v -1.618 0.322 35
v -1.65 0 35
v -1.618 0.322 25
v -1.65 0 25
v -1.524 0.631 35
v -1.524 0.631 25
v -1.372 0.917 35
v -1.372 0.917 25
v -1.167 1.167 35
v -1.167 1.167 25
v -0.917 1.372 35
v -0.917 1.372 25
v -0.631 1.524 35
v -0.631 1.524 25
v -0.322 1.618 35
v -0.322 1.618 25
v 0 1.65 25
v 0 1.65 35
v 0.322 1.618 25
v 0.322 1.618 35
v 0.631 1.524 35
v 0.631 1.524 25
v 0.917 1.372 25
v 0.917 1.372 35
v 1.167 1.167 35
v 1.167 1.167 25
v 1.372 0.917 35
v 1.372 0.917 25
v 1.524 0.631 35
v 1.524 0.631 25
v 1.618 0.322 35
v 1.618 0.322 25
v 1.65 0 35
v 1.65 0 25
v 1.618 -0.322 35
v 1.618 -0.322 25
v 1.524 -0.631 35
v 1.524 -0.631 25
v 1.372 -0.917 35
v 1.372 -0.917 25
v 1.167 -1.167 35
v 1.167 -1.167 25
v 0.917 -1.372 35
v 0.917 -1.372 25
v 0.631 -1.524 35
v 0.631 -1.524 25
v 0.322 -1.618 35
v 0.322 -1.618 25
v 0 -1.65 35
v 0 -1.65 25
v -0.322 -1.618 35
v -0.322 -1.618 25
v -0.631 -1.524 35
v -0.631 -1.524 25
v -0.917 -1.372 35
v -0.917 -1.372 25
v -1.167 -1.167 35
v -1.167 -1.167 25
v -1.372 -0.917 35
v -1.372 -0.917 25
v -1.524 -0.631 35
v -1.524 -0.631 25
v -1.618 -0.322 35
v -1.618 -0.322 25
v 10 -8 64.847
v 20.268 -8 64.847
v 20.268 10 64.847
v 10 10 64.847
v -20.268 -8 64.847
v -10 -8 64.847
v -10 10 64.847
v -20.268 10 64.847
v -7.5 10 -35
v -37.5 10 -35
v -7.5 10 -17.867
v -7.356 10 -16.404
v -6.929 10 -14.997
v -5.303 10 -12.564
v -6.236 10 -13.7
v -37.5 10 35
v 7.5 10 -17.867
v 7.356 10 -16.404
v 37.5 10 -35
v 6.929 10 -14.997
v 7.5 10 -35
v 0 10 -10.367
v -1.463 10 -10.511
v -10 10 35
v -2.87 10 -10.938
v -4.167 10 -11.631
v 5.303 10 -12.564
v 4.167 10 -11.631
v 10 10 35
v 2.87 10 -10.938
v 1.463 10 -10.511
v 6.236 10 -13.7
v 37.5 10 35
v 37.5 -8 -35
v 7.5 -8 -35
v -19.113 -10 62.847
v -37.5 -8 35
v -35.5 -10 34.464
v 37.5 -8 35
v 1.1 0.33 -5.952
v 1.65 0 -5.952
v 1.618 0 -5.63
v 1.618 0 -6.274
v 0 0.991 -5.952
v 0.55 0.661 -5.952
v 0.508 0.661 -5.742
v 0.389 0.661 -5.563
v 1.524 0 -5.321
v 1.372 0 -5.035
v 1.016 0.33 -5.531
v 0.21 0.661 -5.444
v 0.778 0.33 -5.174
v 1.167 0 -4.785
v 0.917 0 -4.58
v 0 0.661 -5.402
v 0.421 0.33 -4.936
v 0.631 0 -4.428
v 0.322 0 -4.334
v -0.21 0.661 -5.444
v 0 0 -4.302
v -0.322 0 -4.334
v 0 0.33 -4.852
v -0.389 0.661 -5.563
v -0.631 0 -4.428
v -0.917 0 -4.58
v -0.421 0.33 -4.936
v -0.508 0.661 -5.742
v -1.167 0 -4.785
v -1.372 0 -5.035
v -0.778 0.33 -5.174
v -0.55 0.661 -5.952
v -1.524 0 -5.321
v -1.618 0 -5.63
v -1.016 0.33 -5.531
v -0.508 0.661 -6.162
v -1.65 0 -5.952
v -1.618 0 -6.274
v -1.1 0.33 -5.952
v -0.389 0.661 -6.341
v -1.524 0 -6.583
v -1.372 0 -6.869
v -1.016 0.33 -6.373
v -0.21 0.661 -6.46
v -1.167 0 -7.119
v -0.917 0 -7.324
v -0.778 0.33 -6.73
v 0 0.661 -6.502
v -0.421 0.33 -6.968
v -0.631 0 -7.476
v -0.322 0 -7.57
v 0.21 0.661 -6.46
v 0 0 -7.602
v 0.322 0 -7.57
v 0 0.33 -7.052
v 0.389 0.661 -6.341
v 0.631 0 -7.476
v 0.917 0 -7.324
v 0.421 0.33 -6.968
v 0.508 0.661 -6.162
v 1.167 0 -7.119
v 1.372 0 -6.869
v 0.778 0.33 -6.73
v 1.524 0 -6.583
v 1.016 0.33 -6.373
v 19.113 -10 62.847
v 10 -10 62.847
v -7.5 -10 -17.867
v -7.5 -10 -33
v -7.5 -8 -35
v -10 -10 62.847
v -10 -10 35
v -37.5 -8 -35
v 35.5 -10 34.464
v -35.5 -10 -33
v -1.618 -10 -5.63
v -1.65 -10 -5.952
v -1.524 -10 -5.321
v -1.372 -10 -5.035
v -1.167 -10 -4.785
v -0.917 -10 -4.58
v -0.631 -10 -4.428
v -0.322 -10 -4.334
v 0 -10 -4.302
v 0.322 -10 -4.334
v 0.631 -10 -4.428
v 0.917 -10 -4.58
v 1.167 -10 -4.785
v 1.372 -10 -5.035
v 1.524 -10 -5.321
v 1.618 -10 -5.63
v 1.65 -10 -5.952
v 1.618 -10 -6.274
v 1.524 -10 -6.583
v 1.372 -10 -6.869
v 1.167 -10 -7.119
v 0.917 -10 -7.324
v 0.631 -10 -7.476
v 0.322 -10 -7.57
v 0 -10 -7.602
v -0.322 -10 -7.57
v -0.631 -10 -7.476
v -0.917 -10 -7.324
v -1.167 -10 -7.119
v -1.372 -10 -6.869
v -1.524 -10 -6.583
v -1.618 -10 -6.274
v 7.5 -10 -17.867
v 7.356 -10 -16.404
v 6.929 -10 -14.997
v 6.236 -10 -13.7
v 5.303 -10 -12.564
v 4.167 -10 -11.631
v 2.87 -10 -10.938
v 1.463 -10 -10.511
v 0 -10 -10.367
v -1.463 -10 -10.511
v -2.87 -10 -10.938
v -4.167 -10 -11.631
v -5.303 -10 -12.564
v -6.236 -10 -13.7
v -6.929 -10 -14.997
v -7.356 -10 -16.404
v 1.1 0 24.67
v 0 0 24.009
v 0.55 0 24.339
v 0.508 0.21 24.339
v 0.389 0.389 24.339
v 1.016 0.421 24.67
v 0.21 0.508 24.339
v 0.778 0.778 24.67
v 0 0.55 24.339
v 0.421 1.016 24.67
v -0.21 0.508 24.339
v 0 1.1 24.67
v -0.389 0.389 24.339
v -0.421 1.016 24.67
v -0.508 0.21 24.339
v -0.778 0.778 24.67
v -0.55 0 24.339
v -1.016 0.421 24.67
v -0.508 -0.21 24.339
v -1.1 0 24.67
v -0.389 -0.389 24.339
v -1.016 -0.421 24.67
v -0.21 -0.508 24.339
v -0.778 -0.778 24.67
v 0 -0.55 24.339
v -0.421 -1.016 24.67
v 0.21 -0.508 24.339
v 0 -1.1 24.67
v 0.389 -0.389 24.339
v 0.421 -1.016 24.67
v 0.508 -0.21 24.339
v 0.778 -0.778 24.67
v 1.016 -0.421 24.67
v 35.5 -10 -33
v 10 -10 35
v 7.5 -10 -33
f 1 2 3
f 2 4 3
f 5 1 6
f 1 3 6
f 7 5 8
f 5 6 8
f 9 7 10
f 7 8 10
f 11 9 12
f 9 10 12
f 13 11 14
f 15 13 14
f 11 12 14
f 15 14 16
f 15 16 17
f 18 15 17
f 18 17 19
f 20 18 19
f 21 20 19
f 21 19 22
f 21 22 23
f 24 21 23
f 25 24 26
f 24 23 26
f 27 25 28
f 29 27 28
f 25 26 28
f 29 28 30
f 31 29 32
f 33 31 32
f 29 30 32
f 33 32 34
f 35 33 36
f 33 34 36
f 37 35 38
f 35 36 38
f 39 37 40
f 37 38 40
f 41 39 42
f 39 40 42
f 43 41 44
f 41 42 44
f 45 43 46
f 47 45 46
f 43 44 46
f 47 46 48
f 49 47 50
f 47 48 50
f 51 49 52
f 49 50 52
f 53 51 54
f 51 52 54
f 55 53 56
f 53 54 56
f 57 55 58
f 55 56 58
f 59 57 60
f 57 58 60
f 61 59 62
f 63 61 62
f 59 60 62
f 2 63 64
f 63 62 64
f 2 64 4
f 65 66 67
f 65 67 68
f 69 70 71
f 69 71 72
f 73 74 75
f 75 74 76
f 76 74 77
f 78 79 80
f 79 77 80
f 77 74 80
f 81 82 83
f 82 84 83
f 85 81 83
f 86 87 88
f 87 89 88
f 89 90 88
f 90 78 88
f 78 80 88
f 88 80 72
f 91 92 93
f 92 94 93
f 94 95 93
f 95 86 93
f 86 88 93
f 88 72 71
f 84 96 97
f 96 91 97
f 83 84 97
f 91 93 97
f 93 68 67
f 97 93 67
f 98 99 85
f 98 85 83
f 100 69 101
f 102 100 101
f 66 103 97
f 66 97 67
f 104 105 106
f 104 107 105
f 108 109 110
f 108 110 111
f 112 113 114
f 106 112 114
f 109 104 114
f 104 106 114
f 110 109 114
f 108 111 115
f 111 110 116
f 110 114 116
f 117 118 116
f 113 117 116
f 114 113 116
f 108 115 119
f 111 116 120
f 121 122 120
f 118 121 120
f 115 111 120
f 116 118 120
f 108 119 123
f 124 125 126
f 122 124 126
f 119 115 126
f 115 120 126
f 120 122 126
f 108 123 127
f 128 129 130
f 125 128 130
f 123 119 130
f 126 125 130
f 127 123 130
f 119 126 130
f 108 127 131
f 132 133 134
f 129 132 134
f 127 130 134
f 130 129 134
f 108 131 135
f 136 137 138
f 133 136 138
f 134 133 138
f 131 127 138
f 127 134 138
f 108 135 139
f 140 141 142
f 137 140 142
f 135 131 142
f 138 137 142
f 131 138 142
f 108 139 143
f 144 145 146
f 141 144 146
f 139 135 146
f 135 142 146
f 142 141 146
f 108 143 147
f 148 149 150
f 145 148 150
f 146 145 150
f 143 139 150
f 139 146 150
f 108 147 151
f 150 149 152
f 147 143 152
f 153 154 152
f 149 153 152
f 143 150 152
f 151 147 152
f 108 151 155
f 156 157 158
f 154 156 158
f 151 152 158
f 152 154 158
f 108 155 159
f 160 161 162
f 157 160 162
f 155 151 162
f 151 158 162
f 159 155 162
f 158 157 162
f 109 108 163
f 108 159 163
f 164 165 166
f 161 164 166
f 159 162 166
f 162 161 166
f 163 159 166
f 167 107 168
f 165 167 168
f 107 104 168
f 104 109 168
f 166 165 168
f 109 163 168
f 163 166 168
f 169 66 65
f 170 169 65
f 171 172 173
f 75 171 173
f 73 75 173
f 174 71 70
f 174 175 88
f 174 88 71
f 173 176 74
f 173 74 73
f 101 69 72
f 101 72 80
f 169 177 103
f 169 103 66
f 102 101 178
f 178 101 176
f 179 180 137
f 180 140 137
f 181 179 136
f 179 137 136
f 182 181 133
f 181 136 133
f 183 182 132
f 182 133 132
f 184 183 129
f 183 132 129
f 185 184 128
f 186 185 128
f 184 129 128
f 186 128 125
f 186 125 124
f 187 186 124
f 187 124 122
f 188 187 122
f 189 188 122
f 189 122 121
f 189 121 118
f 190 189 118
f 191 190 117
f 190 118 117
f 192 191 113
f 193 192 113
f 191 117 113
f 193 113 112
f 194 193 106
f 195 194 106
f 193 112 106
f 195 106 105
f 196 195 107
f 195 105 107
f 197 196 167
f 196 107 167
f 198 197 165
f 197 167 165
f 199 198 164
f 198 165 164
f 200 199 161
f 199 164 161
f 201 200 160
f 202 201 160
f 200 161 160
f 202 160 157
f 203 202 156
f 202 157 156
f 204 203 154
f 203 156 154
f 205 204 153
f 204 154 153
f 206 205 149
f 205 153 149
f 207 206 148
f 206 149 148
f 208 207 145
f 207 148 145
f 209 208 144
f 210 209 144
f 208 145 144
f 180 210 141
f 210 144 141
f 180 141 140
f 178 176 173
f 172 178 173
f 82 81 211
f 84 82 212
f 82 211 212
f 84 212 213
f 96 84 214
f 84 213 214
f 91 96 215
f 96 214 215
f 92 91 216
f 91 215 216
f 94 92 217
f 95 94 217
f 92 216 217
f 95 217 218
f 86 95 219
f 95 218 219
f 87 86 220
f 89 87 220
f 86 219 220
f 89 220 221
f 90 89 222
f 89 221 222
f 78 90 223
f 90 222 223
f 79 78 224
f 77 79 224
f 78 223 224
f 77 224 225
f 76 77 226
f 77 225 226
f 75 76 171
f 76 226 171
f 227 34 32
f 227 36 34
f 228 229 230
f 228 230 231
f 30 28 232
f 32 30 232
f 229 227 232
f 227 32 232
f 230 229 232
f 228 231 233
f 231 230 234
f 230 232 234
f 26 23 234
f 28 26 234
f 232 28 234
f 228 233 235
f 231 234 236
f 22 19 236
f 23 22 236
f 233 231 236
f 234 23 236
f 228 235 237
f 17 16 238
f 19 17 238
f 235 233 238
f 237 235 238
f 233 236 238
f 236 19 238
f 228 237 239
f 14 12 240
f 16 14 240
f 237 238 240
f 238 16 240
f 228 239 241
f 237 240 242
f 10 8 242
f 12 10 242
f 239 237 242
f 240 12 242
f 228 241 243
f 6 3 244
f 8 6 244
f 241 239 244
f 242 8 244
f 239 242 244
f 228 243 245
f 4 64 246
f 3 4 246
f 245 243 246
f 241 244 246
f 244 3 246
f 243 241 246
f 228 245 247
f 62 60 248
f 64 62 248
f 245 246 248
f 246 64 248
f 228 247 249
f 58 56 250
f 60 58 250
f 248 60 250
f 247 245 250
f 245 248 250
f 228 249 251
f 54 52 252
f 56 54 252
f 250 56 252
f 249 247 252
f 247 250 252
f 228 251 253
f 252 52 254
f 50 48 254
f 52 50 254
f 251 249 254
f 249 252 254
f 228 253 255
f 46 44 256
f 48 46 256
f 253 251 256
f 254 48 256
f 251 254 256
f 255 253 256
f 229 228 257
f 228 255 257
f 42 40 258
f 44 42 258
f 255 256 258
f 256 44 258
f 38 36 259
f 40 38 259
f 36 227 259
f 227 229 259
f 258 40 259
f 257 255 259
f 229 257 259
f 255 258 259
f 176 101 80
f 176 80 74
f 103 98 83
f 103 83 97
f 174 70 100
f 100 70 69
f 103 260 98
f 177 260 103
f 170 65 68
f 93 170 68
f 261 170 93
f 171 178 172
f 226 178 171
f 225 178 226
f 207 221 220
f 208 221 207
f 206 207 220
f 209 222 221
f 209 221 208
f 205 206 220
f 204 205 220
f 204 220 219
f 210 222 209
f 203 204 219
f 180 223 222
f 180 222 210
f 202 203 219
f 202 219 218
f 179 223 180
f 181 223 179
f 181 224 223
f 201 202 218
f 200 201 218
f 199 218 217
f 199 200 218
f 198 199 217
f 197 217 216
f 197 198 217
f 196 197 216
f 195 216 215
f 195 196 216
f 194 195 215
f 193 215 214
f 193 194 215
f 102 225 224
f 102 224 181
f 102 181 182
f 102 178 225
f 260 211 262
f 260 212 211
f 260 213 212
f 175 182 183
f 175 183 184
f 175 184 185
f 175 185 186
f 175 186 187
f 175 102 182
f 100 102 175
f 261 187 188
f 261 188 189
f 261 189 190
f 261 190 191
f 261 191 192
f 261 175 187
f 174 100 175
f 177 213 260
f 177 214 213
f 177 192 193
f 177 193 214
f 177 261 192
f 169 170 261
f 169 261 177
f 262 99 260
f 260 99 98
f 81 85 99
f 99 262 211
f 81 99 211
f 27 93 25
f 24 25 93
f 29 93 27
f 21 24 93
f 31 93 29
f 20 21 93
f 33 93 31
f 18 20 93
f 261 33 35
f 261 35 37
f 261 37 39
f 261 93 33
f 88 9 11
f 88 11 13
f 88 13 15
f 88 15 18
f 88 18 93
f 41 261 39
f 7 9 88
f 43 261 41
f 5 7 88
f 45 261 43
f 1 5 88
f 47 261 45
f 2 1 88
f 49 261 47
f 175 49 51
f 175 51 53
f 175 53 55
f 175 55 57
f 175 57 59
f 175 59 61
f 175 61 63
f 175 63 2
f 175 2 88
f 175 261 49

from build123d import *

# Parameters (mm, degrees)
F1_DEPTH = 10
F3_DEPTH = 25
F4_SIZE  = 2
F6_D     = 3.3
F6_DEPTH = 10
F6_TIP   = 0.9914200214
F8_D     = 3.3
F8_DEPTH = 10
F8_TIP   = 0.9914200214


with BuildPart() as f1:
    # F0 (on Front) → F1 (new body, symmetric)
    with BuildSketch(Plane.XZ):
        with BuildLine():
            Line((7.5, -35), (37.5, -35))
            Line((37.5, -35), (37.5, 35))
            Line((37.5, 35), (10, 35))
            Line((10, 35), (-10, 35))
            Line((-10, 35), (-37.5, 35))
            Line((-37.5, 35), (-37.5, -35))
            Line((-37.5, -35), (-7.5, -35))
            Line((-7.5, -35), (-7.5, -17.867))
            ThreePointArc((-7.5, -17.867), (0, -10.367), (7.5, -17.867))
            Line((7.5, -17.867), (7.5, -35))
        make_face()
        with BuildLine():
            Line((-7.5, -35), (7.5, -35))
            Line((7.5, -35), (7.5, -17.867))
            ThreePointArc((7.5, -17.867), (0, -10.367), (-7.5, -17.867))
            Line((-7.5, -17.867), (-7.5, -35))
        make_face()
        Polygon((10, 35), (37.5, 35), (20.2677392039, 64.8471512281), (10, 64.8471512281), align=None)
        Polygon((-37.5, 35), (-10, 35), (-10, 64.8471512281), (-20.2677392039, 64.8471512281), align=None)
    extrude(amount=F1_DEPTH, both=True)

    # F2 (on Front) → F3 (cut, symmetric)
    with BuildSketch(Plane.XZ):
        with BuildLine():
            Line((-7.5, -17.867), (-7.5, -35))
            Line((-7.5, -35), (7.5, -35))
            Line((7.5, -35), (7.5, -17.867))
            ThreePointArc((7.5, -17.867), (0, -10.367), (-7.5, -17.867))
        make_face()
    extrude(amount=F3_DEPTH, both=True, mode=Mode.SUBTRACT)

    # F4
    f4_edges = [f1.edges().sort_by_distance(p)[0] for p in [
        (37.5, -10, 0),
        (28.88387, -10, 49.923576),
        (22.5, -10, -35),
        (-22.5, -10, -35),
        (-37.5, -10, 0),
        (-28.88387, -10, 49.923576),
        (-15.13387, -10, 64.847151),
        (15.13387, -10, 64.847151),
    ]]
    chamfer(f4_edges, length=F4_SIZE)

    # F6
    with Locations(Plane.XZ.offset(10)):
        with Locations((0, -5.952)):
            Hole(F6_D / 2, depth=F6_DEPTH)
            with Locations((0, 0, -(F6_DEPTH + F6_TIP / 2))):  # 118° drill point
                Cone(0, F6_D / 2, F6_TIP, mode=Mode.SUBTRACT)

    # F8
    with Locations(Plane.XY.offset(35)):
        with Locations((0, 0)):
            Hole(F8_D / 2, depth=F8_DEPTH)
            with Locations((0, 0, -(F8_DEPTH + F8_TIP / 2))):  # 118° drill point
                Cone(0, F8_D / 2, F8_TIP, mode=Mode.SUBTRACT)


solid = f1.part
